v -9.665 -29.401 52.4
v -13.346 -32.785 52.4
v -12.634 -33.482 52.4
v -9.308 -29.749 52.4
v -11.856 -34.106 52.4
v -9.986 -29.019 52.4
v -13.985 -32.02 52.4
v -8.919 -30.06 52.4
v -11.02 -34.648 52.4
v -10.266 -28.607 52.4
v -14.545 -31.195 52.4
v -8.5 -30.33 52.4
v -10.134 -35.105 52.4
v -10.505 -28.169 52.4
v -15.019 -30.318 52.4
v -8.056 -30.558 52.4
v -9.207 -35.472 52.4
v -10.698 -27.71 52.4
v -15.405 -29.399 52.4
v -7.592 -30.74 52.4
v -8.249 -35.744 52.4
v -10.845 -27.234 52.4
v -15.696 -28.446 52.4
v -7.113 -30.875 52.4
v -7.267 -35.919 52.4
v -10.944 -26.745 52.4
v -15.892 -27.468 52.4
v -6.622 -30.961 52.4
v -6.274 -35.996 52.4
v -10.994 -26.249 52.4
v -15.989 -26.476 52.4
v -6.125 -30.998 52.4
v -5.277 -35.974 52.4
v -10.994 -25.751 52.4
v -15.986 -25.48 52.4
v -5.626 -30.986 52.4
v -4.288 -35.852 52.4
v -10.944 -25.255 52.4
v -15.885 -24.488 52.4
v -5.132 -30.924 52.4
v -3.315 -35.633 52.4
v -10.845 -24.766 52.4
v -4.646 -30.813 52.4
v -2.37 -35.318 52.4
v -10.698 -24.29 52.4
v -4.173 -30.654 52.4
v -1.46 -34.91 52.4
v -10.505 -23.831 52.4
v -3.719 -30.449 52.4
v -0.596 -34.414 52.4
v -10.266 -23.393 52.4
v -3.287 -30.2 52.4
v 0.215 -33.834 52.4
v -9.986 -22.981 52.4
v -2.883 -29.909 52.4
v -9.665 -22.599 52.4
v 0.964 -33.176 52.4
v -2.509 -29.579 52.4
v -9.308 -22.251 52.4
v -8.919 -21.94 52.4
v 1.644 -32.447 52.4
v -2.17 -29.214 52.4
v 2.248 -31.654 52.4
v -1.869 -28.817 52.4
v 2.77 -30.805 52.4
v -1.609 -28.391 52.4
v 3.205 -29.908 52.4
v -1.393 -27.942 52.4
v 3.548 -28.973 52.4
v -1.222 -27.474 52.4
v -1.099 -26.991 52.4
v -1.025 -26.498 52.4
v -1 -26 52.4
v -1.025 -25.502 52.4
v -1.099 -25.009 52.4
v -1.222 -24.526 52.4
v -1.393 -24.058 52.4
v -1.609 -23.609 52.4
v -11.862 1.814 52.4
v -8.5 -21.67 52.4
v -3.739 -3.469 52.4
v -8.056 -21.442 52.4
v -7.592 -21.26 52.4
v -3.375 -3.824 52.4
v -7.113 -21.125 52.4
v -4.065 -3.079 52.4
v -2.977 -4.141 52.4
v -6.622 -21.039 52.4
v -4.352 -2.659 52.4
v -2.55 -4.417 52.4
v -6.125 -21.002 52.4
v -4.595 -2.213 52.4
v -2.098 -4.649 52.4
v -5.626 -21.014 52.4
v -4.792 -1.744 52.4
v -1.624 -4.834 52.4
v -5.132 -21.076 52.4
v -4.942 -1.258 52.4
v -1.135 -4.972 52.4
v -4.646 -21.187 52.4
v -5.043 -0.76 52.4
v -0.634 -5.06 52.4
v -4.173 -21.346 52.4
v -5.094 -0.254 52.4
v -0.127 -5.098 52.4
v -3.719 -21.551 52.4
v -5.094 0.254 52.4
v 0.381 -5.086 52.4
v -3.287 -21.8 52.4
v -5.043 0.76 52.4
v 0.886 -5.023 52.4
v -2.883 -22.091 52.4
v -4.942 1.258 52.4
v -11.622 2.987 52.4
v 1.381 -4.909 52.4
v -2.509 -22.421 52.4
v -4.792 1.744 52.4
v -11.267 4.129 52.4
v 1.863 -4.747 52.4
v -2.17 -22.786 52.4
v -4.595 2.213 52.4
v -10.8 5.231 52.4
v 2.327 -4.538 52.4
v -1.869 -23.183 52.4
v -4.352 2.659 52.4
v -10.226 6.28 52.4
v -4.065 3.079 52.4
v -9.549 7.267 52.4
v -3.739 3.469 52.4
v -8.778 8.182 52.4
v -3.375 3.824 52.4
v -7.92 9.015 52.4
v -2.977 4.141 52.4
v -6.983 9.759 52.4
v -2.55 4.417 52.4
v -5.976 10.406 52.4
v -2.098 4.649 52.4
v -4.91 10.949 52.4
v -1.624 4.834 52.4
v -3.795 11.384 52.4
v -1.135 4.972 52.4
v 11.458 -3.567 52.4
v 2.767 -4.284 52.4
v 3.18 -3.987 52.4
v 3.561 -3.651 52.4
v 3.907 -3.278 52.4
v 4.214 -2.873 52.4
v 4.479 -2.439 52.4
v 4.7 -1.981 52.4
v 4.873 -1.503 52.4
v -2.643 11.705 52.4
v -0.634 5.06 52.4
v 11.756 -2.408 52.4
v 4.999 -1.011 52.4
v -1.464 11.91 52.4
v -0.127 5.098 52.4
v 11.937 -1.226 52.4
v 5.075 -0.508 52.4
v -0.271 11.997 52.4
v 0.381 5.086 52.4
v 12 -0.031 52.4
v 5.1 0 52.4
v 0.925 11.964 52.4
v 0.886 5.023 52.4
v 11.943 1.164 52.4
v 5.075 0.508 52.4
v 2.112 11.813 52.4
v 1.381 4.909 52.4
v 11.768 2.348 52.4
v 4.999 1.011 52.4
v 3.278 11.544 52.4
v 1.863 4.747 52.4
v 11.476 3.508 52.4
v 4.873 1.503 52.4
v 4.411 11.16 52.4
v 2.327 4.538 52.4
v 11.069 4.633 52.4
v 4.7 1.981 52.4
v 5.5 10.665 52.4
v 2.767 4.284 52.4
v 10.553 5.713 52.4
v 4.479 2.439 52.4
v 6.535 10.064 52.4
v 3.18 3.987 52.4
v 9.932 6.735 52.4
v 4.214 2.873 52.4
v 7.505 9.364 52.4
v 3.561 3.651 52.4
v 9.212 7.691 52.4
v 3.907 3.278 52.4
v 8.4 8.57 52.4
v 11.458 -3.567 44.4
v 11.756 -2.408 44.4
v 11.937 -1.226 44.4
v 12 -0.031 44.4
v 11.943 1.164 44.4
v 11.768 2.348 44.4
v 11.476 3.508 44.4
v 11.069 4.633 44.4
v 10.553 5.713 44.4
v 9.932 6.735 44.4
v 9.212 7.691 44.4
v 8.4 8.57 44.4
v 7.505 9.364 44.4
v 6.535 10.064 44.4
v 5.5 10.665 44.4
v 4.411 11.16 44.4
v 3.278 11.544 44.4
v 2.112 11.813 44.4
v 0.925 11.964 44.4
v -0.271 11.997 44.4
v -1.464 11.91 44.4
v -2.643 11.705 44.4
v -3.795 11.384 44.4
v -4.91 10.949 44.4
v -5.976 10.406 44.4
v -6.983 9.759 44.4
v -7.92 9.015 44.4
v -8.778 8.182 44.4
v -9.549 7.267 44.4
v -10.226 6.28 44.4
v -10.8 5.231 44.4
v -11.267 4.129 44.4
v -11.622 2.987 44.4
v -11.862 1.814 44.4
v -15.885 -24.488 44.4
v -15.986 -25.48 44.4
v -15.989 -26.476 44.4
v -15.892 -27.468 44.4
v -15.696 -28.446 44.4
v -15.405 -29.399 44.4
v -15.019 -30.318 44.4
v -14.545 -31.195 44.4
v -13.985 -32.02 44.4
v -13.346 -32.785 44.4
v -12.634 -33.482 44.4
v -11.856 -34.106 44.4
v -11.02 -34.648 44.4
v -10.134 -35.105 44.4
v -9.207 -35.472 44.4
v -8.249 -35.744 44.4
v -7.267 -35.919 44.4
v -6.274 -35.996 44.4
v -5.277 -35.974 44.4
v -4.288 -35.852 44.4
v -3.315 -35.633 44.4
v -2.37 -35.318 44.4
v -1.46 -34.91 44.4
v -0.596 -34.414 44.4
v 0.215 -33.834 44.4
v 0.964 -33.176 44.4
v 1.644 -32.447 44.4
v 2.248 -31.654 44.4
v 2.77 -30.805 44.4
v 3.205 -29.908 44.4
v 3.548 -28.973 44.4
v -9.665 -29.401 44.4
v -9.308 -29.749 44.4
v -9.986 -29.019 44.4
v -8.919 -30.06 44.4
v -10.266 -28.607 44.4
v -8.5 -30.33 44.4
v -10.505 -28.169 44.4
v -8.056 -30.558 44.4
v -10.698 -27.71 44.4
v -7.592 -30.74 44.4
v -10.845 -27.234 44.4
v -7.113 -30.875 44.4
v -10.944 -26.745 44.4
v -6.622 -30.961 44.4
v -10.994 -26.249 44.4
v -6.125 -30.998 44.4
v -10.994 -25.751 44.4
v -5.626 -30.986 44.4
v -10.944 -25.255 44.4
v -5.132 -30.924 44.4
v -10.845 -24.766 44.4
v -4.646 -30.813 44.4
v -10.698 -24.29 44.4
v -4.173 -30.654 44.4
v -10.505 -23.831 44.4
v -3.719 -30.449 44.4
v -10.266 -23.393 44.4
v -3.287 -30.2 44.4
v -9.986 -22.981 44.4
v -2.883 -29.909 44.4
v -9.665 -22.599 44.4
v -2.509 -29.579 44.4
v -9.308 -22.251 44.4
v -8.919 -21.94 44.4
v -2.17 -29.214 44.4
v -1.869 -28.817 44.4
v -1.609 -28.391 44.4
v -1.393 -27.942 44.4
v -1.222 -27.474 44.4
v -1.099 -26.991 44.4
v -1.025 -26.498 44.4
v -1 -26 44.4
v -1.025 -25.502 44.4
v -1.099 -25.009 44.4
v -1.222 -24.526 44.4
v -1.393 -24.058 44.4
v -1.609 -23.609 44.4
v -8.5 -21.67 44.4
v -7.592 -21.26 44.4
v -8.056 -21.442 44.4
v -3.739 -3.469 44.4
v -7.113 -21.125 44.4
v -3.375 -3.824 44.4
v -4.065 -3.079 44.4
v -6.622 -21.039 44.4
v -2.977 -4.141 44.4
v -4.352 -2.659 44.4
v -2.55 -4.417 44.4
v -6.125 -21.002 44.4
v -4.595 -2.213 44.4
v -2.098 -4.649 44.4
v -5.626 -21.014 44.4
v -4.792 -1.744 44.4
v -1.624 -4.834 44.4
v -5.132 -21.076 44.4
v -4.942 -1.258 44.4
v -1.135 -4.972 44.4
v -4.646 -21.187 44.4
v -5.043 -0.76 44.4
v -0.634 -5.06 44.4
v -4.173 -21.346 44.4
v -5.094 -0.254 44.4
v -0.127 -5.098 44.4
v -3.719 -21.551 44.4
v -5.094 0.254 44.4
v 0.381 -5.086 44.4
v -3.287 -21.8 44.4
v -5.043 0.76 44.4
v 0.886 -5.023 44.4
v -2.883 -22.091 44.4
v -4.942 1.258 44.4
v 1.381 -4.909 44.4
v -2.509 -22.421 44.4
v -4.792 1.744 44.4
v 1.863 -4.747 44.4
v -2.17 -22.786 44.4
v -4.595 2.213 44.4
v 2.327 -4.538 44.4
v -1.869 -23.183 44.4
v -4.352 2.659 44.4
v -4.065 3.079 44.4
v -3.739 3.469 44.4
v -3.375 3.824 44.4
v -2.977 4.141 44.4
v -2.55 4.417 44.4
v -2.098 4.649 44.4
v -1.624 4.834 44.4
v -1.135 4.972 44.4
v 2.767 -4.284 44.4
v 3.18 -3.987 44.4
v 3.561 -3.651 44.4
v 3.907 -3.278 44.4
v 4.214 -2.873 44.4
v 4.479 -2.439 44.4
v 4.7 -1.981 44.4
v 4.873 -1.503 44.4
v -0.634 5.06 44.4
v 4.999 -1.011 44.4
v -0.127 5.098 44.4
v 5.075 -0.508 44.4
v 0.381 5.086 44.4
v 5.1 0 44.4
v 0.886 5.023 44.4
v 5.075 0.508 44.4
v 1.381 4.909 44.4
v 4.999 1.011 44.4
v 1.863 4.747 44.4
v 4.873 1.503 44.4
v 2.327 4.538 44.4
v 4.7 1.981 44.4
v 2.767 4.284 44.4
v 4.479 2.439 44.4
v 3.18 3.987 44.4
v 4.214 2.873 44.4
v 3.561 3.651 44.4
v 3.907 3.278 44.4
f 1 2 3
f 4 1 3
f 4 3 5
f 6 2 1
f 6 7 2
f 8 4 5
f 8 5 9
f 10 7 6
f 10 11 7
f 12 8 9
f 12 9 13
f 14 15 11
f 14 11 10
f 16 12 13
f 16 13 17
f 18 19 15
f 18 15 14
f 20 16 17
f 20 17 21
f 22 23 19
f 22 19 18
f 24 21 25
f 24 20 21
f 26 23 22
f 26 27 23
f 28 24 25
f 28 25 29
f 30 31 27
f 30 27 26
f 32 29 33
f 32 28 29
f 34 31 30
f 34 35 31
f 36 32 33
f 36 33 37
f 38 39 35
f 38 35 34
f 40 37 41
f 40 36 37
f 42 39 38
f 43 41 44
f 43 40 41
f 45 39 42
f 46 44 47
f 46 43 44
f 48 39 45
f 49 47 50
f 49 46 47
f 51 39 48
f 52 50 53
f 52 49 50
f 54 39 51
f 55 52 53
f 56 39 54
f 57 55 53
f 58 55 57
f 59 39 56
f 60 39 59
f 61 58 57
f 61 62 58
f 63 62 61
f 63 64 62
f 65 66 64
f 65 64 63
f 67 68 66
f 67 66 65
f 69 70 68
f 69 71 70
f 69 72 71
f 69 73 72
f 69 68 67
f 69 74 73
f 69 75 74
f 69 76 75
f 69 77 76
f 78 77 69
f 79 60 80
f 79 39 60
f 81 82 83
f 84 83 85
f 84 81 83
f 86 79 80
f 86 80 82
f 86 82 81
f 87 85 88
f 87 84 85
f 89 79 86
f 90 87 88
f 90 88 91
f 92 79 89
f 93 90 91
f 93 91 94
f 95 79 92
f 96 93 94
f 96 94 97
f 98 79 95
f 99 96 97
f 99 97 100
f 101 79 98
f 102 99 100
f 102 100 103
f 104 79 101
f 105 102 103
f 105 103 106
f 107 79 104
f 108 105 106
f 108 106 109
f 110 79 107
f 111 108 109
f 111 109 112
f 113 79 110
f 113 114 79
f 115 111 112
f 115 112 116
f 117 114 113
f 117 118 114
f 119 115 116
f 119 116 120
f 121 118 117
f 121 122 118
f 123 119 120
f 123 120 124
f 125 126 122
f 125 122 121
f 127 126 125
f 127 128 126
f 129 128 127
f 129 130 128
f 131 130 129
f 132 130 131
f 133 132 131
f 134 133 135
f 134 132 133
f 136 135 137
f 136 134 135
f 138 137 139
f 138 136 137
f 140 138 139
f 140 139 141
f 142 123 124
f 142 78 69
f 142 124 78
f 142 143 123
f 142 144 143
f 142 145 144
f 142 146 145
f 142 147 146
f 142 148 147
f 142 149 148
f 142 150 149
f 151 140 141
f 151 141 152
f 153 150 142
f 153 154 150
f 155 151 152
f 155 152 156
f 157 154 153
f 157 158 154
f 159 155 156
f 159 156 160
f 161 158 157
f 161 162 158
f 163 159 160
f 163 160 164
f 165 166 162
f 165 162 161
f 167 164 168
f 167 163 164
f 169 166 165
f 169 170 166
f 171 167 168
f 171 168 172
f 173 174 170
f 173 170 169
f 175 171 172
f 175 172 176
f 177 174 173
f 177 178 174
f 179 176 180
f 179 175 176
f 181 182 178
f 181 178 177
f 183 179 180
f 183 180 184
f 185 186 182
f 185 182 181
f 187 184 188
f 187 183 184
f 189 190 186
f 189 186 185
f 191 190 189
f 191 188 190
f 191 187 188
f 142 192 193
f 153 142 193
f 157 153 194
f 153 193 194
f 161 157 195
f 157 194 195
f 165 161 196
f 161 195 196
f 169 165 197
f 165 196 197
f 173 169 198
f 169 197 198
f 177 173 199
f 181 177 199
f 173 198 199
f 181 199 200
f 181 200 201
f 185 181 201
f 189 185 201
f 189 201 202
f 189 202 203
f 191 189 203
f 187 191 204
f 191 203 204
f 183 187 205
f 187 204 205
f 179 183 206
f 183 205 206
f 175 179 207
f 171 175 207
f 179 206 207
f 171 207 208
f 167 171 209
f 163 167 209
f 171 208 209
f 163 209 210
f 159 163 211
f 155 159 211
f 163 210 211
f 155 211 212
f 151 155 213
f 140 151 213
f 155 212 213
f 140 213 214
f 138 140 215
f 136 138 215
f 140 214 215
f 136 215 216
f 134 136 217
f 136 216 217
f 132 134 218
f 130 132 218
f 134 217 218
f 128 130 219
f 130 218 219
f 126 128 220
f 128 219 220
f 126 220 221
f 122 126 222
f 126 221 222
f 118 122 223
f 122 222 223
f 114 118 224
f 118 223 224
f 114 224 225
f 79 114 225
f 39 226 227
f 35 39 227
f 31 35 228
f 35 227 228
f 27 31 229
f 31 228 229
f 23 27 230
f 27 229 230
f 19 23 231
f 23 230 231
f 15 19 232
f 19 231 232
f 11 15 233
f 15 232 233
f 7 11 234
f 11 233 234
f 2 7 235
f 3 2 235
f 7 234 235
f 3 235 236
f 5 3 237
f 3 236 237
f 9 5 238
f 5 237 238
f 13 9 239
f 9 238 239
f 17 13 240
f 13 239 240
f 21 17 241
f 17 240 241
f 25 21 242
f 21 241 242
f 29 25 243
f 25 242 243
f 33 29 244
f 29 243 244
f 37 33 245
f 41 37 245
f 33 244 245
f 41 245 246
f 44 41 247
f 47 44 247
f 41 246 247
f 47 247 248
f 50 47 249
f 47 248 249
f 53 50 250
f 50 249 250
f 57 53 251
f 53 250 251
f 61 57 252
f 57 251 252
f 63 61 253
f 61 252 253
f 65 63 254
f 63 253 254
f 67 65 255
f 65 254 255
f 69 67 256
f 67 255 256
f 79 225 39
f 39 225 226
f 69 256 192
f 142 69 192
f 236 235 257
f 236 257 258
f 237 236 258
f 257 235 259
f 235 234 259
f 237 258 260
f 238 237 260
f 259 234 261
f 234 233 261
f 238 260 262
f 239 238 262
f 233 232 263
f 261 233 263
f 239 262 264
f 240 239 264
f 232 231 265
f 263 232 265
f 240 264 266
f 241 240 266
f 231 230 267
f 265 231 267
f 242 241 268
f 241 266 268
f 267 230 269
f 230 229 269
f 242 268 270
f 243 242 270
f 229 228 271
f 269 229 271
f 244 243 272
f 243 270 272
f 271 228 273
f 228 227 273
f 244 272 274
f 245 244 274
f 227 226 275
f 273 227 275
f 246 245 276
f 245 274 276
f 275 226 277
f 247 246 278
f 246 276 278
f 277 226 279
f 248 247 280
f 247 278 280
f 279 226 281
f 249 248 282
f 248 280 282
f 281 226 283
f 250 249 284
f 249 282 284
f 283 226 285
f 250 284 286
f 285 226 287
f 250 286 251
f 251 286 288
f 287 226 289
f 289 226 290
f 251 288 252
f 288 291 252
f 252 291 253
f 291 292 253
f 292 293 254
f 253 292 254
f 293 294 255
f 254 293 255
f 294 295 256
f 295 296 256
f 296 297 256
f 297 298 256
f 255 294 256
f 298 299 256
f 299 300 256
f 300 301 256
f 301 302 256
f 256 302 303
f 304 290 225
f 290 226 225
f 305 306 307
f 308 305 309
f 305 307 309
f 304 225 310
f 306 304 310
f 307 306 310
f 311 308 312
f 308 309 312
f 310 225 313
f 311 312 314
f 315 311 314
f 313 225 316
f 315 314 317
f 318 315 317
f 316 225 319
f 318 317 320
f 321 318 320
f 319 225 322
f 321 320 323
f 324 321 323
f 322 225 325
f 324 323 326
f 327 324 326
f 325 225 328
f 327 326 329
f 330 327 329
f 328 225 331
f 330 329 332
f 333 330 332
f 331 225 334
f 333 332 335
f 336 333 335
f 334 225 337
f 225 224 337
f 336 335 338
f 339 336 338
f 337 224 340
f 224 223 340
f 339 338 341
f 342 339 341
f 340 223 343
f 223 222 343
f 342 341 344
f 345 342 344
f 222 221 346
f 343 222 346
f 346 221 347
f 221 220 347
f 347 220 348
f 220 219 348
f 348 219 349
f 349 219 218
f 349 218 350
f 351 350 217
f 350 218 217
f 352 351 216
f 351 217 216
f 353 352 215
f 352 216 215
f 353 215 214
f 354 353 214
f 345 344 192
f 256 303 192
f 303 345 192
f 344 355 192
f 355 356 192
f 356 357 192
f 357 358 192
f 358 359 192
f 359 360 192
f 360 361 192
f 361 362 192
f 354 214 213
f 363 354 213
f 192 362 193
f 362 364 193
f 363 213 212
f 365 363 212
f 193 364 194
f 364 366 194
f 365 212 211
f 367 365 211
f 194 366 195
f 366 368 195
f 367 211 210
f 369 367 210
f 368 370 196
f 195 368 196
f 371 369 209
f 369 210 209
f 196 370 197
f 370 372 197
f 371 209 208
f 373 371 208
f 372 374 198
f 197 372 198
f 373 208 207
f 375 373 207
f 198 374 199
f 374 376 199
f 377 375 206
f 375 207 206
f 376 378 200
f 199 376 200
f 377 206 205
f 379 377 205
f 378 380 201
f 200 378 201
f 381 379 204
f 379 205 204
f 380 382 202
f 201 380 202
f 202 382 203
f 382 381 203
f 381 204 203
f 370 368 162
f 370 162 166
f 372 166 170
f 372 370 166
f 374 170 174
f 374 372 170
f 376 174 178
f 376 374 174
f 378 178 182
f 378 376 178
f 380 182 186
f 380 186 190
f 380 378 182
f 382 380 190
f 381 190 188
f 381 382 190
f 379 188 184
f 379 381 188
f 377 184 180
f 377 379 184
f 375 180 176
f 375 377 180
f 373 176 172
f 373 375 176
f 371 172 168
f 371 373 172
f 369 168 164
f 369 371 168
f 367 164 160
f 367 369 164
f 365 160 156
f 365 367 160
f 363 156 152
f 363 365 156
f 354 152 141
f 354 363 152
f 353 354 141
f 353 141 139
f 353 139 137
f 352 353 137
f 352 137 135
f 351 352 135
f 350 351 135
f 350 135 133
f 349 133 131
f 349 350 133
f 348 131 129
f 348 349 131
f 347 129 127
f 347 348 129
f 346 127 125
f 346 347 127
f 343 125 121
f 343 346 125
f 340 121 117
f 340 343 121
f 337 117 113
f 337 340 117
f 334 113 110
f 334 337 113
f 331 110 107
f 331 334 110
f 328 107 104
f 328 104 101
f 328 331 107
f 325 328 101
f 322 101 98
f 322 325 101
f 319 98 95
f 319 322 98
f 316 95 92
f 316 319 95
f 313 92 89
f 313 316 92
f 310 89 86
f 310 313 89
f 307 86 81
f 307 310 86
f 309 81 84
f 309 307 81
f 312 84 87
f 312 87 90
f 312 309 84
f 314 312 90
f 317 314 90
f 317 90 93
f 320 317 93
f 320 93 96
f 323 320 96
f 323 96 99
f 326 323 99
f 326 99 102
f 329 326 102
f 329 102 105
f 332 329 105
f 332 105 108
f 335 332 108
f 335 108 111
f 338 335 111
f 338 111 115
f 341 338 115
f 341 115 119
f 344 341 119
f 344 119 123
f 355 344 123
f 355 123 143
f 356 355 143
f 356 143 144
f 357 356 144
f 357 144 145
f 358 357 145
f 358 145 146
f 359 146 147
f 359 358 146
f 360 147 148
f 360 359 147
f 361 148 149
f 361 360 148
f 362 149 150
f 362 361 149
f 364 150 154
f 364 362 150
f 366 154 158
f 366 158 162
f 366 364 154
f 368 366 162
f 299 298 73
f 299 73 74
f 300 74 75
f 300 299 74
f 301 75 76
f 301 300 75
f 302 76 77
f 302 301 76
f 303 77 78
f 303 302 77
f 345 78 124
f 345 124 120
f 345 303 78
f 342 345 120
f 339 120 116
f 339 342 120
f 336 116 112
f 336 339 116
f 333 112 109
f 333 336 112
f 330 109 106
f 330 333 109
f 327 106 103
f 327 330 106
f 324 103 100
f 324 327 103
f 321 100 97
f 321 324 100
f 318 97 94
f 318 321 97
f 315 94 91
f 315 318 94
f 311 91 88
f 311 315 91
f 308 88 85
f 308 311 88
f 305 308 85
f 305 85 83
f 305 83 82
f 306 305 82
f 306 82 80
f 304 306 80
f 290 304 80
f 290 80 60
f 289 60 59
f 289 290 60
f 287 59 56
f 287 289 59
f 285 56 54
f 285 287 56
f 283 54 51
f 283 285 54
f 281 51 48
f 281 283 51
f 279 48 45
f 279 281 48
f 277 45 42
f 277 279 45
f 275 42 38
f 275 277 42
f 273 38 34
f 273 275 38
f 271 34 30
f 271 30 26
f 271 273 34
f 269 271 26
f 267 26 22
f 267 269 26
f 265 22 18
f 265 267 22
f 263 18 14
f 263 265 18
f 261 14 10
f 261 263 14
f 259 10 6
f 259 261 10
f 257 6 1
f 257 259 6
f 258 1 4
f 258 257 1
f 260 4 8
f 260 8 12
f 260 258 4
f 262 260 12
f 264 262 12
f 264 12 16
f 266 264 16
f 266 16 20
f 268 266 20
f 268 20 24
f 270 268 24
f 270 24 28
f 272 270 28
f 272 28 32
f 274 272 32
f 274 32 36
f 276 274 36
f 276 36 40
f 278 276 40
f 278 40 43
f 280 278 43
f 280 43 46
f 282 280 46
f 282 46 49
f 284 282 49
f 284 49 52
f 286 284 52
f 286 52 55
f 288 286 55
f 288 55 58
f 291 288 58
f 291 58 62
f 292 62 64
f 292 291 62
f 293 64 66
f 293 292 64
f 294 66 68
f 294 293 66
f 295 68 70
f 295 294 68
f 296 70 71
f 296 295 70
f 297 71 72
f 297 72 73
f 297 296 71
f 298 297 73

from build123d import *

# Parameters (mm, degrees)
SK_PATILLA_R   = 5.1
SK_PATILLA_R_2 = 5
PATILLA_DEPTH  = 8


with BuildPart() as part:
    # Sk_Patilla → Patilla (new body)
    with BuildSketch(Plane.XY.offset(44.4)):
        with BuildLine():
            Line((3.547963542, -28.972606971), (11.45755625, -3.567128365))
            ThreePointArc((11.45755625, -3.567128365), (2.69831408, 11.692694348), (-11.862050632, 1.814319377))
            Line((-11.862050632, 1.814319377), (-15.885042193, -24.488067186))
            ThreePointArc((-15.885042193, -24.488067186), (-8.248595067, -35.743911957), (3.547963542, -28.972606971))
        make_face()
        Circle(SK_PATILLA_R, mode=Mode.SUBTRACT)
        with Locations((-6, -26)):
            Circle(SK_PATILLA_R_2, mode=Mode.SUBTRACT)
    extrude(amount=PATILLA_DEPTH)


solid = part.part
